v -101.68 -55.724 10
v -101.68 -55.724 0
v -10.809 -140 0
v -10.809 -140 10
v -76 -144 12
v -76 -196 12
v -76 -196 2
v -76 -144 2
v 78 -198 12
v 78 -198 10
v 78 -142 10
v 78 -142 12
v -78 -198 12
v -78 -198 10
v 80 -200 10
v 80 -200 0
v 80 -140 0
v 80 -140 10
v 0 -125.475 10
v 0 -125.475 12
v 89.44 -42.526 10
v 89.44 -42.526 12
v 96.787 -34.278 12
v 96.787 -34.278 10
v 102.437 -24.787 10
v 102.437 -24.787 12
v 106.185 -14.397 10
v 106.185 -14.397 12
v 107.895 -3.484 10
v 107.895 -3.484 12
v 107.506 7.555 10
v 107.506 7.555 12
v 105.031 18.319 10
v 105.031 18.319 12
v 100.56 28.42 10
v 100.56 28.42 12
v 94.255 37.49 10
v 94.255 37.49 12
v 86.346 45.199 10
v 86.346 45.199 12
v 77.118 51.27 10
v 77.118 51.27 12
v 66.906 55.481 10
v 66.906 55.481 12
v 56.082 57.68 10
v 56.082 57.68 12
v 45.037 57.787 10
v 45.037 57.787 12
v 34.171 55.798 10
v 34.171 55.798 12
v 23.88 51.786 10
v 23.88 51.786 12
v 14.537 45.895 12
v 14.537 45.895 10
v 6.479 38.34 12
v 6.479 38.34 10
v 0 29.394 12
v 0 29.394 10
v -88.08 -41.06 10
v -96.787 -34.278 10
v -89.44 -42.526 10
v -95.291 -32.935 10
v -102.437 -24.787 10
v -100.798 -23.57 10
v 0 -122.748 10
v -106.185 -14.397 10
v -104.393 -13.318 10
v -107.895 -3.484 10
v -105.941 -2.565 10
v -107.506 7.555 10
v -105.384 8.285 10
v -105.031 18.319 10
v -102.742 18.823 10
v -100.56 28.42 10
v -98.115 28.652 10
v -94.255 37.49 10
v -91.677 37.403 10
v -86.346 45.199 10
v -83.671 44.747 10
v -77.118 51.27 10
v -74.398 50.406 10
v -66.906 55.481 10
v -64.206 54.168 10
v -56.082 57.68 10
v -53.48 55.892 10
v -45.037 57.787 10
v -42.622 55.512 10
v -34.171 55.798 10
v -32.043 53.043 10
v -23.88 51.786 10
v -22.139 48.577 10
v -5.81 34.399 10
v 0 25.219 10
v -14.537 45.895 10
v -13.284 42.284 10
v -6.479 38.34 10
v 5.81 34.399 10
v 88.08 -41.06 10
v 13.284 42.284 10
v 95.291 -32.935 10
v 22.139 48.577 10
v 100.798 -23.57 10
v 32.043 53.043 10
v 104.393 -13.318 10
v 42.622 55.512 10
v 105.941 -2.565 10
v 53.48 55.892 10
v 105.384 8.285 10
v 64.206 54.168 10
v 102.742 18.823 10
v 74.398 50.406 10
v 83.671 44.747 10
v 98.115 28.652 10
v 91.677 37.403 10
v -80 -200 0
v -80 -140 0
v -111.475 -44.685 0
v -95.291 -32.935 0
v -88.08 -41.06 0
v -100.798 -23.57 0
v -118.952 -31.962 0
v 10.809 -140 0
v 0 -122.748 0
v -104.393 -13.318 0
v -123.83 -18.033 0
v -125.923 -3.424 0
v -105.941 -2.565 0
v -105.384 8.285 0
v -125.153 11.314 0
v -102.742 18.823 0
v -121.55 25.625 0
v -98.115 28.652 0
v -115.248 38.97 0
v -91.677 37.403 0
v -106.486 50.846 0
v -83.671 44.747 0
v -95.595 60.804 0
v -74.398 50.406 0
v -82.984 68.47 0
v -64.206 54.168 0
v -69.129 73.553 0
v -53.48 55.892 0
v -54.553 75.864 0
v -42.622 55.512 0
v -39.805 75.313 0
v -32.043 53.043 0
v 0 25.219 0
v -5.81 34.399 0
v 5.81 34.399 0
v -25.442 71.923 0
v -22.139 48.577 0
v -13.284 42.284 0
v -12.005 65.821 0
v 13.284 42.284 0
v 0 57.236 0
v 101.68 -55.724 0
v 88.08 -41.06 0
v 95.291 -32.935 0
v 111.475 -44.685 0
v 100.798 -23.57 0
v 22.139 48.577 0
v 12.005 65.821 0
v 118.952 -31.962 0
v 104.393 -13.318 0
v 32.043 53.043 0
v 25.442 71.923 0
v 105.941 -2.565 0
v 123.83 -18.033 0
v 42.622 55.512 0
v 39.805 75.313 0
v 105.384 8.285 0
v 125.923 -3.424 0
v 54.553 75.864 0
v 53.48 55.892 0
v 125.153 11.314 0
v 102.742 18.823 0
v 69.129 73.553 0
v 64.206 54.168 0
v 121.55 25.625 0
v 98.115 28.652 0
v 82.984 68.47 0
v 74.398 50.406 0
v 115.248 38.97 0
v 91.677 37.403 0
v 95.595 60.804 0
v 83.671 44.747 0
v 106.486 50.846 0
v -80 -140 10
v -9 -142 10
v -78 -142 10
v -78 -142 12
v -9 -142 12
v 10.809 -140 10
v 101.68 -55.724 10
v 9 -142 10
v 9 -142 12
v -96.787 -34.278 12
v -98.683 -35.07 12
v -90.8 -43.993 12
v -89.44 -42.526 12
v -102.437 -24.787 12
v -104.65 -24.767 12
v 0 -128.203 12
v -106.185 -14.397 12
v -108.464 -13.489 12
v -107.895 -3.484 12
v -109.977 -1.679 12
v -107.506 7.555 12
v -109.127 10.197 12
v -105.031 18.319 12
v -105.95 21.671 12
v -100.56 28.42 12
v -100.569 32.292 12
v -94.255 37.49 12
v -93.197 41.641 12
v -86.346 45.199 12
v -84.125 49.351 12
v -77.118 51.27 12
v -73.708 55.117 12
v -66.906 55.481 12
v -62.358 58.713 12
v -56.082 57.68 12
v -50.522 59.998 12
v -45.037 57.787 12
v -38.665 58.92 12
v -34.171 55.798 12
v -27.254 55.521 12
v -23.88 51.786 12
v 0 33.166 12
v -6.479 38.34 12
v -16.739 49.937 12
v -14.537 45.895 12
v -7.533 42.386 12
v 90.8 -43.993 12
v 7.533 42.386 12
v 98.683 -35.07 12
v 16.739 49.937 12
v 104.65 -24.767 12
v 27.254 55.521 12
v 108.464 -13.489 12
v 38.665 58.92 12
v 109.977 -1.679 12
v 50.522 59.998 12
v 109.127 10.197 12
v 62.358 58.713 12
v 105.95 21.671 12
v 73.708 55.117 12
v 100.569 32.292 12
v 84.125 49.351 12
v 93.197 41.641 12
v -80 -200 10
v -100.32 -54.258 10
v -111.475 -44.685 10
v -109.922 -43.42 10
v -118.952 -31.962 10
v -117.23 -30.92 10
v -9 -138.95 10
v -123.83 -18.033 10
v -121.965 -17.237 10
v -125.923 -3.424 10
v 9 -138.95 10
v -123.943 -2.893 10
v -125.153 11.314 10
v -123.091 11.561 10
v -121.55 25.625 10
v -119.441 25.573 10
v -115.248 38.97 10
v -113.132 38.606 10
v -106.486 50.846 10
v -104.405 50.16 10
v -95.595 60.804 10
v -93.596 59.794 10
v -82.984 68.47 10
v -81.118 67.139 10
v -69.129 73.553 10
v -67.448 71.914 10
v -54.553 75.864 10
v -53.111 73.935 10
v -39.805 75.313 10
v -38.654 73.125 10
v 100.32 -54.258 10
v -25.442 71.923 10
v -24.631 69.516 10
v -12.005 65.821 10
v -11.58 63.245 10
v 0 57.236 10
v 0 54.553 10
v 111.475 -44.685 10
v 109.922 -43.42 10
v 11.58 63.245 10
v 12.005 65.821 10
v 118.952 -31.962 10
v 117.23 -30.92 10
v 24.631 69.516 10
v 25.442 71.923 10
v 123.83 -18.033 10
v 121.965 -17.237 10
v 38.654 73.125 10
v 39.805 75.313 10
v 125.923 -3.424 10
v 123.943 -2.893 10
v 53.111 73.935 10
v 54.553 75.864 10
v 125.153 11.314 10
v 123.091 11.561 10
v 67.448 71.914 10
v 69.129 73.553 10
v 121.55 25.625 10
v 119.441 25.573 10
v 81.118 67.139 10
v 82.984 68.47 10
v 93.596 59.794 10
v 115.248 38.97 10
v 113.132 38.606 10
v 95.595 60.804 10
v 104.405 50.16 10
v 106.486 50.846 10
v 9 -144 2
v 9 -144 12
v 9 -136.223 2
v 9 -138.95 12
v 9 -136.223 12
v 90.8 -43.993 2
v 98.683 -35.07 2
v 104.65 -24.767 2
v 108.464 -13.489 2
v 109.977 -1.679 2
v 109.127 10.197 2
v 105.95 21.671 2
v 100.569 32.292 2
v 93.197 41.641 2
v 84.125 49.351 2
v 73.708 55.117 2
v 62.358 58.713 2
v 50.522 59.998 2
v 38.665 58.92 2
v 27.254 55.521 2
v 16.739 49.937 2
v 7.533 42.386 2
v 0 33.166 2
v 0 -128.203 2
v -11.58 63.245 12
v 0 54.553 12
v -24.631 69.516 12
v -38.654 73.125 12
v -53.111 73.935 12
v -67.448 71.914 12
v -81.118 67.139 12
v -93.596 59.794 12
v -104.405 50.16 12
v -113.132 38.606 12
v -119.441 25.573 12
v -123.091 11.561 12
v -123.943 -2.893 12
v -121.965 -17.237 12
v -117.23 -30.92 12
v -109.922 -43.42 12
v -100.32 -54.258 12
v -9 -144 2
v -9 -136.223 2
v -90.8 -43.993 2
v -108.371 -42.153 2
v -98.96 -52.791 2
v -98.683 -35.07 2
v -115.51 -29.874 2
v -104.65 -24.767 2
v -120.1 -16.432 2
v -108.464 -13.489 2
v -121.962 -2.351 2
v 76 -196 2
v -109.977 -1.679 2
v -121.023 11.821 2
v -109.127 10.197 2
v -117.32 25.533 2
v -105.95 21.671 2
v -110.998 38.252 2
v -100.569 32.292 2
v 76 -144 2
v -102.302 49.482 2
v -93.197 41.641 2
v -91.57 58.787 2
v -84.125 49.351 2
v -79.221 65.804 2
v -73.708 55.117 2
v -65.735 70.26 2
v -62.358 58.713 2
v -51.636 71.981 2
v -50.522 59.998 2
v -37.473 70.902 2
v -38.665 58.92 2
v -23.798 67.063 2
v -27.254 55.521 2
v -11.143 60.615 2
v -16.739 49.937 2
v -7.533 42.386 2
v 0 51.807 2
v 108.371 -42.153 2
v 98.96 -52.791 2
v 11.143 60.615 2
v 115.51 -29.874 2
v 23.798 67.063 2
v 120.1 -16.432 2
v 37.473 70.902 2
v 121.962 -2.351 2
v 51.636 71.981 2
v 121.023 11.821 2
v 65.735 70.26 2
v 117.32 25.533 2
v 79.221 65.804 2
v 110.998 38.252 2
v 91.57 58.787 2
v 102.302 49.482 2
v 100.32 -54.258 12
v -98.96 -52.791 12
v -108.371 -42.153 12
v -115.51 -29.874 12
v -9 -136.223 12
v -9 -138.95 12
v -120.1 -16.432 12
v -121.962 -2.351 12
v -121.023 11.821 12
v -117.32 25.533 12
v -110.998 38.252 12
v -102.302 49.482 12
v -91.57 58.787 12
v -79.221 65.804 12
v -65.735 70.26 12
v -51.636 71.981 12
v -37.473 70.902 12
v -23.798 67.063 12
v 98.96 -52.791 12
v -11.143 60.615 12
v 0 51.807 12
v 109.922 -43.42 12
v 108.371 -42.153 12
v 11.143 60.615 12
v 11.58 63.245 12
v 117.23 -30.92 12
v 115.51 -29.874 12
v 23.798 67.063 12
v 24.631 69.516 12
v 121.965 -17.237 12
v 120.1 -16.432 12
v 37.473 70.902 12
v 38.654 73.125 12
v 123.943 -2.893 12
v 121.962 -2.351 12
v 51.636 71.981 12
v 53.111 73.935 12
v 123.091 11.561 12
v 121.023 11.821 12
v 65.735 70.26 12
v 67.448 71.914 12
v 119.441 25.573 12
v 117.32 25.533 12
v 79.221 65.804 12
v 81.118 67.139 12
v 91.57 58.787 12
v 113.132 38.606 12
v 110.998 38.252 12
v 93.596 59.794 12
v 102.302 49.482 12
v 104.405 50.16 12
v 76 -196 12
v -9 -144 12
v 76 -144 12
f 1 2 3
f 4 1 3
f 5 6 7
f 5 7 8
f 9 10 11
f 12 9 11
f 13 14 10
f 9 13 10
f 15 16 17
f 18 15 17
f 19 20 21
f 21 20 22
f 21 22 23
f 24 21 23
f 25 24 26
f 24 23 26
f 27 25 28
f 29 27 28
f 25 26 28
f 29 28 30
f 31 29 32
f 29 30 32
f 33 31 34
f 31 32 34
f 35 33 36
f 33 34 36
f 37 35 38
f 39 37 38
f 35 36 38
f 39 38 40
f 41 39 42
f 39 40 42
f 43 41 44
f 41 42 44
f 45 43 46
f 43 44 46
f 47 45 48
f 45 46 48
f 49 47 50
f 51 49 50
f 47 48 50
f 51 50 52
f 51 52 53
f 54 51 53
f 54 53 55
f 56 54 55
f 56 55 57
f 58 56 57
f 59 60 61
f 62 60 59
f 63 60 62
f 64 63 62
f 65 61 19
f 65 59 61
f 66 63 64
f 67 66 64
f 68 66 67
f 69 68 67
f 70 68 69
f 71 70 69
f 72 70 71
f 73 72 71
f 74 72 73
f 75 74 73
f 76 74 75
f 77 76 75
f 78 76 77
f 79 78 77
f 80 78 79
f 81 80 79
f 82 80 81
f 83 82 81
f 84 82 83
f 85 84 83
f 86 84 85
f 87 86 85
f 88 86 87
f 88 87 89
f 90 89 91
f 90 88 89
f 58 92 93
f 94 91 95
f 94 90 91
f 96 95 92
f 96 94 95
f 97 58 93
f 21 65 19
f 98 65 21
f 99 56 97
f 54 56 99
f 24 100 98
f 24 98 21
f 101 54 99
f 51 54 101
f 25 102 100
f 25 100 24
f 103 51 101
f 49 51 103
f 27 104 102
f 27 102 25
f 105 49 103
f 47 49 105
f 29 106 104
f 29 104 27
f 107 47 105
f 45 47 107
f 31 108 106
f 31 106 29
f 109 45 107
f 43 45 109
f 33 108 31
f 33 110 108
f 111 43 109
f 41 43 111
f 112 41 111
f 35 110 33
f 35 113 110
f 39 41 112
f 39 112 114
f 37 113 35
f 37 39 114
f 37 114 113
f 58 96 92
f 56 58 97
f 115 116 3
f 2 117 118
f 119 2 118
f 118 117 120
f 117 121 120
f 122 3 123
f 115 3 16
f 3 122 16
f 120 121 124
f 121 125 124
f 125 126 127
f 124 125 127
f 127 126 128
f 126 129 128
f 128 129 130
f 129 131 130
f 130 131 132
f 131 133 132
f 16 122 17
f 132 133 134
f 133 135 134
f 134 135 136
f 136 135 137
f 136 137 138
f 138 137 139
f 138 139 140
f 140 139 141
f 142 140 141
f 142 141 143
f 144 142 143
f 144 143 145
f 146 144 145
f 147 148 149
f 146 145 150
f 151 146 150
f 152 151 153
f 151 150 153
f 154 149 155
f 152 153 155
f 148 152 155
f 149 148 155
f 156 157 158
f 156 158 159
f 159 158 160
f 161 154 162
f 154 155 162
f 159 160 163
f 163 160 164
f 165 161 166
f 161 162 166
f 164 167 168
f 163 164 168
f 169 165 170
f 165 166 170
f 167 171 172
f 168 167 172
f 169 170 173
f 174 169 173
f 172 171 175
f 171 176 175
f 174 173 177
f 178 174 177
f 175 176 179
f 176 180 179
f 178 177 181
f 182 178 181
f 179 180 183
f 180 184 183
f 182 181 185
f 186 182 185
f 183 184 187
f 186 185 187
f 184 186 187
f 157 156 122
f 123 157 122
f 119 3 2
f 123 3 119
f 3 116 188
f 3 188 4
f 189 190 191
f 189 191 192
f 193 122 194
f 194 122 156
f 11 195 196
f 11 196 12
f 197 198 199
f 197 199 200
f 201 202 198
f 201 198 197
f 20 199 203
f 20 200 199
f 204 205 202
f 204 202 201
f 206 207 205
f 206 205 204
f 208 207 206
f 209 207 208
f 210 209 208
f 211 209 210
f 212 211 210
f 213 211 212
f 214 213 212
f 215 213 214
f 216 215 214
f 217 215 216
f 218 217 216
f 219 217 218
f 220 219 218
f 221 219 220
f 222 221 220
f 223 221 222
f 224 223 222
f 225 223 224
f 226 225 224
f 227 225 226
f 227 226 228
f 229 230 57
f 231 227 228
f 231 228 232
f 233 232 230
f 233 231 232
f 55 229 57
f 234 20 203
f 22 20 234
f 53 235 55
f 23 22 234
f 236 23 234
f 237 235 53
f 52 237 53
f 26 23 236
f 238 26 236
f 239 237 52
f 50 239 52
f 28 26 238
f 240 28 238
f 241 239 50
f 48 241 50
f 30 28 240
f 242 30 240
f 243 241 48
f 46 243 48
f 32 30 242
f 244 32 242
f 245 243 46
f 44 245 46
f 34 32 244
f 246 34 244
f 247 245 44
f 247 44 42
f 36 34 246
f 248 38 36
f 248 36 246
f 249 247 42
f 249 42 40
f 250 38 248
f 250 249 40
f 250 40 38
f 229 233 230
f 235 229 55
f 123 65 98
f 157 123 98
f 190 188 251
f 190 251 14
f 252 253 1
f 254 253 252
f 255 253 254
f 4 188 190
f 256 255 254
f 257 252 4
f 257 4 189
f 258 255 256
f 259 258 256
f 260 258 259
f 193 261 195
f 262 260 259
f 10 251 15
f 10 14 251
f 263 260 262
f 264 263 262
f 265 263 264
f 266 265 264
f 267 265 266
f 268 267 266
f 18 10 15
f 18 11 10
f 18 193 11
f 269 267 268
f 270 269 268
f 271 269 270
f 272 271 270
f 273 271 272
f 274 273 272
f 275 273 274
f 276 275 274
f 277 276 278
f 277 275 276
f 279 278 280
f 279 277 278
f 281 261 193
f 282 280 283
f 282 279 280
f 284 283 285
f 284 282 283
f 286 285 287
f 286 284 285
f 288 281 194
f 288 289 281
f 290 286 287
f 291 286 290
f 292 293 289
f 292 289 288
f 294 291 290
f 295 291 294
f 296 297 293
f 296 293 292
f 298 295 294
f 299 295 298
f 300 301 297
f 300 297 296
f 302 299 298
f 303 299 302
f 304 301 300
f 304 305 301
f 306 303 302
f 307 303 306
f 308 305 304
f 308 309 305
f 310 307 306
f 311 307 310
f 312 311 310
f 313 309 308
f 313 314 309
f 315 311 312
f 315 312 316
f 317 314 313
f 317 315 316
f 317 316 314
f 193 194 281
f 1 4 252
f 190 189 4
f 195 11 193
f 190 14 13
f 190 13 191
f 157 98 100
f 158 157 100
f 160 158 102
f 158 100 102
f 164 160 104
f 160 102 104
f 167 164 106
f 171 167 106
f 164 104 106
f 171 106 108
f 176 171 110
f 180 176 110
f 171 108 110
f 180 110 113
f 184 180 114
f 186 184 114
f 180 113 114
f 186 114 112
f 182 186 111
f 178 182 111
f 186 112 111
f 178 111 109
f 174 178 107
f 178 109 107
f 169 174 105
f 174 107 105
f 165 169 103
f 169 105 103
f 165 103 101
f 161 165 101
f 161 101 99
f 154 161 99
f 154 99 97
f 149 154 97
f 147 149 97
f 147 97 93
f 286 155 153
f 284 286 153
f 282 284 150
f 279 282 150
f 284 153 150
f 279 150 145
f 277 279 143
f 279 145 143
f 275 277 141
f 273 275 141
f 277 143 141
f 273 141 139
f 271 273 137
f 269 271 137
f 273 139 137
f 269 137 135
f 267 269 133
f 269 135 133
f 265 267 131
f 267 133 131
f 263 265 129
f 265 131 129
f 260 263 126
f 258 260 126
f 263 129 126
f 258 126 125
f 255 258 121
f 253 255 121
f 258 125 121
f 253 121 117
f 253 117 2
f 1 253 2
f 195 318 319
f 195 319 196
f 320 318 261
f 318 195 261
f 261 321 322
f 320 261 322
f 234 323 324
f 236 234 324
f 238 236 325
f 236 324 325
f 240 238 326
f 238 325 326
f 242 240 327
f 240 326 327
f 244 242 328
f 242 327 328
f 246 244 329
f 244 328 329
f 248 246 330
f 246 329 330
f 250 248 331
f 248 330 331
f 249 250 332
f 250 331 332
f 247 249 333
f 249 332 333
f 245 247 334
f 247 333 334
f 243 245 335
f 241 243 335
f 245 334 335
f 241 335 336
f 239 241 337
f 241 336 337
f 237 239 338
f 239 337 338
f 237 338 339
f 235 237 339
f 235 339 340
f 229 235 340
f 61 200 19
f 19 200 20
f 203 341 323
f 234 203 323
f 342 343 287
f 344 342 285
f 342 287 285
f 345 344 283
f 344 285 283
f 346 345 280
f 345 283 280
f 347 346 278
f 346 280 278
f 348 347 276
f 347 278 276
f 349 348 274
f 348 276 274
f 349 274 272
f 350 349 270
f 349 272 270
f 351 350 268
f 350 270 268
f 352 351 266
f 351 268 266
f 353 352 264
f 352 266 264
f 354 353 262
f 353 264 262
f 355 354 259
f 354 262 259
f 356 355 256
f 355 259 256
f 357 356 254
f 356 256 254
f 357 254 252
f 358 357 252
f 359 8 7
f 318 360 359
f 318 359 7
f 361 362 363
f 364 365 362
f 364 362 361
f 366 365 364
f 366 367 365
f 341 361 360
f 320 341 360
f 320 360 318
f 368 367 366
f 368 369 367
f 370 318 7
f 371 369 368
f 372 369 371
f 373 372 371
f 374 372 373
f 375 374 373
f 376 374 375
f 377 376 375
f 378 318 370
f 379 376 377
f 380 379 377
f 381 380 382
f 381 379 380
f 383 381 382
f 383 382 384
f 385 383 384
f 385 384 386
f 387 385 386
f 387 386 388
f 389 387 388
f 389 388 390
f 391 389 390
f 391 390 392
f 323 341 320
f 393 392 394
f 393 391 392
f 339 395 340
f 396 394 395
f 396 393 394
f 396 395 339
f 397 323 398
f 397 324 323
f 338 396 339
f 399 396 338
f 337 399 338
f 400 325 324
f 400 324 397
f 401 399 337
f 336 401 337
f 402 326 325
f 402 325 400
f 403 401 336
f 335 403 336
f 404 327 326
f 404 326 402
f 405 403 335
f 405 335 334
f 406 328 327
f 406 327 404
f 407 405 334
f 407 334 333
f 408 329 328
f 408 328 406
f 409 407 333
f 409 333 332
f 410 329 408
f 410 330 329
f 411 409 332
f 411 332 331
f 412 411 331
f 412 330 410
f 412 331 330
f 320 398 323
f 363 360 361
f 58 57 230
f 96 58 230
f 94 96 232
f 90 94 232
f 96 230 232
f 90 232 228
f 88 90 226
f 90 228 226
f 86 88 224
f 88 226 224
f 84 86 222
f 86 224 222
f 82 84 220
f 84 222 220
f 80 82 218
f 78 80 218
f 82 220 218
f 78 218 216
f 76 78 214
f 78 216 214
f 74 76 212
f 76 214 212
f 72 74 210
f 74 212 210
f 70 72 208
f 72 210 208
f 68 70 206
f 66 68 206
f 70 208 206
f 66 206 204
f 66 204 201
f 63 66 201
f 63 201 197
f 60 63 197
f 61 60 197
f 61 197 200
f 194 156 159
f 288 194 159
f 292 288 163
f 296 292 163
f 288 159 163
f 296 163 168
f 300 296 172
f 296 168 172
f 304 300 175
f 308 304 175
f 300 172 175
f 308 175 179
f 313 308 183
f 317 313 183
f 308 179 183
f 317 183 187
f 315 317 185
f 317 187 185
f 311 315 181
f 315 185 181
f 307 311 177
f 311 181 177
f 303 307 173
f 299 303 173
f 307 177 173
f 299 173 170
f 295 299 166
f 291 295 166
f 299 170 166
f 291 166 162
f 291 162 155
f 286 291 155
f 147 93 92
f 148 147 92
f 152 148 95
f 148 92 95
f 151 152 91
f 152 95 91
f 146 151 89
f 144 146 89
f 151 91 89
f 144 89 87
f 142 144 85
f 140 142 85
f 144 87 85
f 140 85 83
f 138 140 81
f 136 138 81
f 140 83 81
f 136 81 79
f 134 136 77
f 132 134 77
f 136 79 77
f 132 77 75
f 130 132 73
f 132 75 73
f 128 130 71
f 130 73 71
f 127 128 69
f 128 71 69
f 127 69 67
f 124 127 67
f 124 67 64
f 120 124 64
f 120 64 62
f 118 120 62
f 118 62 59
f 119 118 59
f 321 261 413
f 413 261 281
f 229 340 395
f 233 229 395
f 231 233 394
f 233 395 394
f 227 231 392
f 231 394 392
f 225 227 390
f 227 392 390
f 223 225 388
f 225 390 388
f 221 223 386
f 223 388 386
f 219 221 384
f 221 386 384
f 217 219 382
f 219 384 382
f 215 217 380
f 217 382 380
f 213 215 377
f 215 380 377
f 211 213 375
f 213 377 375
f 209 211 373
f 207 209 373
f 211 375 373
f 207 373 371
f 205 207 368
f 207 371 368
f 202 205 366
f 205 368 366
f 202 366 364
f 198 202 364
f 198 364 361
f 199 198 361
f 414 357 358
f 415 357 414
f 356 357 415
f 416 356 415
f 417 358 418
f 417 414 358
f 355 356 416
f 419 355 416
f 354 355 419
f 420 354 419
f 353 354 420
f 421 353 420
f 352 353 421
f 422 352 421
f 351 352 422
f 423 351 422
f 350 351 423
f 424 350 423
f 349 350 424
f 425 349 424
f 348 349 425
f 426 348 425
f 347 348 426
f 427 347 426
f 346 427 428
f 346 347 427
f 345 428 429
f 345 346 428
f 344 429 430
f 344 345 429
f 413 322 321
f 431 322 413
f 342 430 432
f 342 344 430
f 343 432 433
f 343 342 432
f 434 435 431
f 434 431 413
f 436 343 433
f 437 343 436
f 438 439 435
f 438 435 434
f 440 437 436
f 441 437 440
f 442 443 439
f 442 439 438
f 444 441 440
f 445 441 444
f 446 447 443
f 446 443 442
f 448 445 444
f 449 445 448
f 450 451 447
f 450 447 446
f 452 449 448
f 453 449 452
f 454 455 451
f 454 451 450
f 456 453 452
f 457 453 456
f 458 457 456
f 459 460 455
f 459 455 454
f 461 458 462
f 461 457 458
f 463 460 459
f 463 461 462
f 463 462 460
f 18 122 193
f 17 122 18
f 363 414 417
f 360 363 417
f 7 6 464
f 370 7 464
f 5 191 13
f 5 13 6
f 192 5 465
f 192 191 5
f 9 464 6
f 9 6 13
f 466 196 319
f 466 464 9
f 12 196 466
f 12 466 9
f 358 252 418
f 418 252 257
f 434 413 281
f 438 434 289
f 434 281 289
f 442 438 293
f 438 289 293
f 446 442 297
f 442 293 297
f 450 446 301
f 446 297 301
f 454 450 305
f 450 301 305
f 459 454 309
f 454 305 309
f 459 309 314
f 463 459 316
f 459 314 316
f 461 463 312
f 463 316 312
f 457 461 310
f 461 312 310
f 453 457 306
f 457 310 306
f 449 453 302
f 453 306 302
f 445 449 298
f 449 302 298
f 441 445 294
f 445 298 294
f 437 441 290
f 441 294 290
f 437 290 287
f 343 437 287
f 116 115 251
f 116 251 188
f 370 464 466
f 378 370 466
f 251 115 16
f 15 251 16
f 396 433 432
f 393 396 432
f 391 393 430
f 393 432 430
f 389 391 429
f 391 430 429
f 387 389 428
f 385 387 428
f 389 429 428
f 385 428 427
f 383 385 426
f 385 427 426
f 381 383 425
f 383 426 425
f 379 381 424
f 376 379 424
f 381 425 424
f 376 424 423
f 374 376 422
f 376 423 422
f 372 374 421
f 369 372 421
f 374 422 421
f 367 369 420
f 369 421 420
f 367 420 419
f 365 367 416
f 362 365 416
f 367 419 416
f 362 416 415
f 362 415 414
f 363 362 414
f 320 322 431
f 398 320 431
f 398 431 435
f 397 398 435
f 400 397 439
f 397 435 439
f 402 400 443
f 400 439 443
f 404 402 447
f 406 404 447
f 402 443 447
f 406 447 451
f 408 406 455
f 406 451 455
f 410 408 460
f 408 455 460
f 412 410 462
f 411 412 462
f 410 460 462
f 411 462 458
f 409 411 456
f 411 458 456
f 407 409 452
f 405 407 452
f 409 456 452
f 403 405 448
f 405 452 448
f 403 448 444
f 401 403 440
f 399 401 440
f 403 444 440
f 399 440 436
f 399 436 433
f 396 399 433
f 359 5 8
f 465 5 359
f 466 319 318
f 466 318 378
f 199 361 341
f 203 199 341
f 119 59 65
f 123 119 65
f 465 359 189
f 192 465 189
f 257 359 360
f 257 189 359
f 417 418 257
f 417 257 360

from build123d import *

# Parameters (mm, degrees)
PAD_DEPTH       = 10
PAD003_DEPTH    = 12
POCKET_DEPTH    = 10
PAD004_DEPTH    = 12
POCKET004_DEPTH = 2
POCKET001_DEPTH = 10.001
SKETCH004_W     = 160
SKETCH004_H     = 60
PAD002_DEPTH    = 10
SKETCH005_W     = 156
SKETCH005_H     = 56
PAD005_DEPTH    = 12
SKETCH009_W     = 152
SKETCH009_H     = 52
POCKET006_DEPTH = 10
SKETCH006_W     = 18
SKETCH006_H     = 12
POCKET005_DEPTH = 10


with BuildPart() as part:
    # Sketch001 → Pad (new body)
    with BuildSketch(Plane.XY):
        with BuildLine():
            ThreePointArc((0, 57.236352), (-106.486482, 50.845622), (-101.68, -55.72412))
            Line((-101.68, -55.72412), (0, -150.0248))
            Line((0, -150.0248), (101.68, -55.72412))
            ThreePointArc((101.68, -55.72412), (106.486482, 50.845622), (0, 57.236352))
        make_face()
    extrude(amount=PAD_DEPTH)

    # Sketch002 → Pad003 (join)
    with BuildSketch(Plane.XY):
        with BuildLine():
            ThreePointArc((0, 54.552727), (-104.405447, 50.160217), (-100.32, -54.257696))
            Line((-100.32, -54.257696), (0, -147.297076))
            Line((0, -147.297076), (100.32, -54.257696))
            ThreePointArc((100.32, -54.257696), (104.405447, 50.160217), (0, 54.552727))
        make_face()
    extrude(amount=PAD003_DEPTH)

    # Sketch007 → Pocket (cut)
    with BuildSketch(Plane.XY.offset(12)):
        with BuildLine():
            ThreePointArc((0, 51.807335), (-102.301889, 49.482446), (-98.96, -52.791272))
            Line((-98.96, -52.791272), (0, -144.569352))
            Line((0, -144.569352), (98.96, -52.791272))
            ThreePointArc((98.96, -52.791272), (102.301889, 49.482446), (0, 51.807335))
        make_face()
    extrude(amount=-POCKET_DEPTH, mode=Mode.SUBTRACT)

    # Sketch008 → Pad004 (join)
    with BuildSketch(Plane.XY):
        with BuildLine():
            ThreePointArc((0, 33.166248), (-88.852758, 45.721583), (-90.8, -43.992727))
            Line((-90.8, -43.992727), (0, -128.203011))
            Line((0, -128.203011), (90.8, -43.992727))
            ThreePointArc((90.8, -43.992727), (88.852758, 45.721583), (0, 33.166248))
        make_face()
    extrude(amount=PAD004_DEPTH)

    # Sketch003 → Pocket004 (cut)
    with BuildSketch(Plane.XY.offset(12)):
        with BuildLine():
            ThreePointArc((0, 29.393877), (-86.345652, 45.199486), (-89.44, -42.526302))
            Line((-89.44, -42.526302), (0, -125.475287))
            Line((0, -125.475287), (89.44, -42.526302))
            ThreePointArc((89.44, -42.526302), (86.345652, 45.199486), (0, 29.393877))
        make_face()
    extrude(amount=-POCKET004_DEPTH, mode=Mode.SUBTRACT)

    # Sketch → Pocket001 (cut, through all)
    with BuildSketch(Plane.XY.offset(10)):
        with BuildLine():
            ThreePointArc((0, 25.21904), (-83.671135, 44.74656), (-88.08, -41.059878))
            Line((-88.08, -41.059878), (0, -122.747563))
            Line((0, -122.747563), (88.08, -41.059878))
            ThreePointArc((88.08, -41.059878), (83.671135, 44.74656), (0, 25.21904))
        make_face()
    extrude(amount=-POCKET001_DEPTH, mode=Mode.SUBTRACT)

    # Sketch004 → Pad002 (join)
    with BuildSketch(Plane.XY):
        with Locations((0, -170)):
            Rectangle(SKETCH004_W, SKETCH004_H)
    extrude(amount=PAD002_DEPTH)

    # Sketch005 → Pad005 (join)
    with BuildSketch(Plane.XY):
        with Locations((0, -170)):
            Rectangle(SKETCH005_W, SKETCH005_H)
    extrude(amount=PAD005_DEPTH)

    # Sketch009 → Pocket006 (cut)
    with BuildSketch(Plane.XY.offset(12)):
        with Locations((0, -170)):
            Rectangle(SKETCH009_W, SKETCH009_H)
    extrude(amount=-POCKET006_DEPTH, mode=Mode.SUBTRACT)

    # Sketch006 → Pocket005 (cut)
    with BuildSketch(Plane.XY.offset(12)):
        with Locations((0, -142.076699)):
            Rectangle(SKETCH006_W, SKETCH006_H)
    extrude(amount=-POCKET005_DEPTH, mode=Mode.SUBTRACT)


solid = part.part
